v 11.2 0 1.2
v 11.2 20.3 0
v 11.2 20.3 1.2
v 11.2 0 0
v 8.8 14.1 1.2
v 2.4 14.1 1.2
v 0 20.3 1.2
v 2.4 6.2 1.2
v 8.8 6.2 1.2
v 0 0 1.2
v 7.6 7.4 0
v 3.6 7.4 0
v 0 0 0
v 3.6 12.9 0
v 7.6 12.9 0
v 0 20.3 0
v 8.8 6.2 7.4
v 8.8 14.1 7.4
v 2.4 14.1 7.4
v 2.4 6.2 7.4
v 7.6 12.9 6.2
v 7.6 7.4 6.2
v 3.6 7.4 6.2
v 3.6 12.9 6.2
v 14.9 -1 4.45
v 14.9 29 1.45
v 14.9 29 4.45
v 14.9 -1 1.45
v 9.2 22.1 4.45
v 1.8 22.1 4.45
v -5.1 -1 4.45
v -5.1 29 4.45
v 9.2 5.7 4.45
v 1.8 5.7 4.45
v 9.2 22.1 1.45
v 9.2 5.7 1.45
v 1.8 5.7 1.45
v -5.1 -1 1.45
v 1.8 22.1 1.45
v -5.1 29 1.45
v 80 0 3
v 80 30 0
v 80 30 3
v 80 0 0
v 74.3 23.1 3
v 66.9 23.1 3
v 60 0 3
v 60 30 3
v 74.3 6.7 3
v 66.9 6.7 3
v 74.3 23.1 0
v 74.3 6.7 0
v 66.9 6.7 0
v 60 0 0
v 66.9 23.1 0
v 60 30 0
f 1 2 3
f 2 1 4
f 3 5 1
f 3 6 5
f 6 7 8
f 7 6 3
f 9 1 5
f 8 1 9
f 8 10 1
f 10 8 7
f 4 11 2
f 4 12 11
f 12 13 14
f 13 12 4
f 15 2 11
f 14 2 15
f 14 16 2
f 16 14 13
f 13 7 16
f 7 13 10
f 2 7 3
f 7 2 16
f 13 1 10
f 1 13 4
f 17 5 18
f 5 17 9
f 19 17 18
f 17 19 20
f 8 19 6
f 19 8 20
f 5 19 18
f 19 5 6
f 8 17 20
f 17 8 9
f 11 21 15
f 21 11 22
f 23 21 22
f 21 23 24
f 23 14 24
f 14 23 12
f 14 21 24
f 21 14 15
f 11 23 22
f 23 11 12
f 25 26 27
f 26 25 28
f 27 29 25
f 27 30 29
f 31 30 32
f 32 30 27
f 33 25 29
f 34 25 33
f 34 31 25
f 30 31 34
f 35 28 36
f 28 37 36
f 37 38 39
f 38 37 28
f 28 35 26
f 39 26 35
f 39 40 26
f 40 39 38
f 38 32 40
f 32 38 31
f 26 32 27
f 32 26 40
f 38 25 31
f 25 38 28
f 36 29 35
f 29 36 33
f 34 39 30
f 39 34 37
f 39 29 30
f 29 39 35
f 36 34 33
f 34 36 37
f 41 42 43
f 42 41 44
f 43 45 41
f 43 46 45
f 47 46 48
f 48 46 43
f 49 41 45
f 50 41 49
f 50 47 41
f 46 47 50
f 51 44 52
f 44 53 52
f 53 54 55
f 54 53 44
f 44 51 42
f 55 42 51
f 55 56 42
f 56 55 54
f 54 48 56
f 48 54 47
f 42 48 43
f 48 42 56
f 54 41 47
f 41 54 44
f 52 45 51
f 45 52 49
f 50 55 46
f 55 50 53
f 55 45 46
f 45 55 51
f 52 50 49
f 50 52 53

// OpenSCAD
wall_thickness = 1.2;

switch_width = 4;
switch_depth = 5.5;
switch_height = 5;

difference() {
    union() {
        cube([switch_width + 6*wall_thickness, switch_depth + 4*wall_thickness + 10, wall_thickness]);

        translate([2*wall_thickness, wall_thickness + 5, wall_thickness])
        cube([4 + 2*wall_thickness, 5.5 + 2*wall_thickness, 5 + wall_thickness]);
    }

    translate([3*wall_thickness, 2*wall_thickness + 5, -0.5])
    cube([switch_width, switch_depth, switch_height + wall_thickness + 0.5]);
}


translate([-3*wall_thickness - 1.5, -1, wall_thickness + 0.25])
difference() {
    cube([20, 30, 3]);

    translate([switch_width + 2*wall_thickness + 0.5, switch_depth + wall_thickness, -0.5])
    cube([switch_width + 2*wall_thickness + 1, switch_height + 2*wall_thickness + 9, 4]);
}


difference() {
    translate([60, 0, 0])
    cube([20, 30, 3]);

    translate([60 + switch_width + 2*wall_thickness + 0.5, switch_depth + wall_thickness, -0.5])
    cube([switch_width + 2*wall_thickness + 1, switch_height + 2*wall_thickness + 9, 4]);
}
